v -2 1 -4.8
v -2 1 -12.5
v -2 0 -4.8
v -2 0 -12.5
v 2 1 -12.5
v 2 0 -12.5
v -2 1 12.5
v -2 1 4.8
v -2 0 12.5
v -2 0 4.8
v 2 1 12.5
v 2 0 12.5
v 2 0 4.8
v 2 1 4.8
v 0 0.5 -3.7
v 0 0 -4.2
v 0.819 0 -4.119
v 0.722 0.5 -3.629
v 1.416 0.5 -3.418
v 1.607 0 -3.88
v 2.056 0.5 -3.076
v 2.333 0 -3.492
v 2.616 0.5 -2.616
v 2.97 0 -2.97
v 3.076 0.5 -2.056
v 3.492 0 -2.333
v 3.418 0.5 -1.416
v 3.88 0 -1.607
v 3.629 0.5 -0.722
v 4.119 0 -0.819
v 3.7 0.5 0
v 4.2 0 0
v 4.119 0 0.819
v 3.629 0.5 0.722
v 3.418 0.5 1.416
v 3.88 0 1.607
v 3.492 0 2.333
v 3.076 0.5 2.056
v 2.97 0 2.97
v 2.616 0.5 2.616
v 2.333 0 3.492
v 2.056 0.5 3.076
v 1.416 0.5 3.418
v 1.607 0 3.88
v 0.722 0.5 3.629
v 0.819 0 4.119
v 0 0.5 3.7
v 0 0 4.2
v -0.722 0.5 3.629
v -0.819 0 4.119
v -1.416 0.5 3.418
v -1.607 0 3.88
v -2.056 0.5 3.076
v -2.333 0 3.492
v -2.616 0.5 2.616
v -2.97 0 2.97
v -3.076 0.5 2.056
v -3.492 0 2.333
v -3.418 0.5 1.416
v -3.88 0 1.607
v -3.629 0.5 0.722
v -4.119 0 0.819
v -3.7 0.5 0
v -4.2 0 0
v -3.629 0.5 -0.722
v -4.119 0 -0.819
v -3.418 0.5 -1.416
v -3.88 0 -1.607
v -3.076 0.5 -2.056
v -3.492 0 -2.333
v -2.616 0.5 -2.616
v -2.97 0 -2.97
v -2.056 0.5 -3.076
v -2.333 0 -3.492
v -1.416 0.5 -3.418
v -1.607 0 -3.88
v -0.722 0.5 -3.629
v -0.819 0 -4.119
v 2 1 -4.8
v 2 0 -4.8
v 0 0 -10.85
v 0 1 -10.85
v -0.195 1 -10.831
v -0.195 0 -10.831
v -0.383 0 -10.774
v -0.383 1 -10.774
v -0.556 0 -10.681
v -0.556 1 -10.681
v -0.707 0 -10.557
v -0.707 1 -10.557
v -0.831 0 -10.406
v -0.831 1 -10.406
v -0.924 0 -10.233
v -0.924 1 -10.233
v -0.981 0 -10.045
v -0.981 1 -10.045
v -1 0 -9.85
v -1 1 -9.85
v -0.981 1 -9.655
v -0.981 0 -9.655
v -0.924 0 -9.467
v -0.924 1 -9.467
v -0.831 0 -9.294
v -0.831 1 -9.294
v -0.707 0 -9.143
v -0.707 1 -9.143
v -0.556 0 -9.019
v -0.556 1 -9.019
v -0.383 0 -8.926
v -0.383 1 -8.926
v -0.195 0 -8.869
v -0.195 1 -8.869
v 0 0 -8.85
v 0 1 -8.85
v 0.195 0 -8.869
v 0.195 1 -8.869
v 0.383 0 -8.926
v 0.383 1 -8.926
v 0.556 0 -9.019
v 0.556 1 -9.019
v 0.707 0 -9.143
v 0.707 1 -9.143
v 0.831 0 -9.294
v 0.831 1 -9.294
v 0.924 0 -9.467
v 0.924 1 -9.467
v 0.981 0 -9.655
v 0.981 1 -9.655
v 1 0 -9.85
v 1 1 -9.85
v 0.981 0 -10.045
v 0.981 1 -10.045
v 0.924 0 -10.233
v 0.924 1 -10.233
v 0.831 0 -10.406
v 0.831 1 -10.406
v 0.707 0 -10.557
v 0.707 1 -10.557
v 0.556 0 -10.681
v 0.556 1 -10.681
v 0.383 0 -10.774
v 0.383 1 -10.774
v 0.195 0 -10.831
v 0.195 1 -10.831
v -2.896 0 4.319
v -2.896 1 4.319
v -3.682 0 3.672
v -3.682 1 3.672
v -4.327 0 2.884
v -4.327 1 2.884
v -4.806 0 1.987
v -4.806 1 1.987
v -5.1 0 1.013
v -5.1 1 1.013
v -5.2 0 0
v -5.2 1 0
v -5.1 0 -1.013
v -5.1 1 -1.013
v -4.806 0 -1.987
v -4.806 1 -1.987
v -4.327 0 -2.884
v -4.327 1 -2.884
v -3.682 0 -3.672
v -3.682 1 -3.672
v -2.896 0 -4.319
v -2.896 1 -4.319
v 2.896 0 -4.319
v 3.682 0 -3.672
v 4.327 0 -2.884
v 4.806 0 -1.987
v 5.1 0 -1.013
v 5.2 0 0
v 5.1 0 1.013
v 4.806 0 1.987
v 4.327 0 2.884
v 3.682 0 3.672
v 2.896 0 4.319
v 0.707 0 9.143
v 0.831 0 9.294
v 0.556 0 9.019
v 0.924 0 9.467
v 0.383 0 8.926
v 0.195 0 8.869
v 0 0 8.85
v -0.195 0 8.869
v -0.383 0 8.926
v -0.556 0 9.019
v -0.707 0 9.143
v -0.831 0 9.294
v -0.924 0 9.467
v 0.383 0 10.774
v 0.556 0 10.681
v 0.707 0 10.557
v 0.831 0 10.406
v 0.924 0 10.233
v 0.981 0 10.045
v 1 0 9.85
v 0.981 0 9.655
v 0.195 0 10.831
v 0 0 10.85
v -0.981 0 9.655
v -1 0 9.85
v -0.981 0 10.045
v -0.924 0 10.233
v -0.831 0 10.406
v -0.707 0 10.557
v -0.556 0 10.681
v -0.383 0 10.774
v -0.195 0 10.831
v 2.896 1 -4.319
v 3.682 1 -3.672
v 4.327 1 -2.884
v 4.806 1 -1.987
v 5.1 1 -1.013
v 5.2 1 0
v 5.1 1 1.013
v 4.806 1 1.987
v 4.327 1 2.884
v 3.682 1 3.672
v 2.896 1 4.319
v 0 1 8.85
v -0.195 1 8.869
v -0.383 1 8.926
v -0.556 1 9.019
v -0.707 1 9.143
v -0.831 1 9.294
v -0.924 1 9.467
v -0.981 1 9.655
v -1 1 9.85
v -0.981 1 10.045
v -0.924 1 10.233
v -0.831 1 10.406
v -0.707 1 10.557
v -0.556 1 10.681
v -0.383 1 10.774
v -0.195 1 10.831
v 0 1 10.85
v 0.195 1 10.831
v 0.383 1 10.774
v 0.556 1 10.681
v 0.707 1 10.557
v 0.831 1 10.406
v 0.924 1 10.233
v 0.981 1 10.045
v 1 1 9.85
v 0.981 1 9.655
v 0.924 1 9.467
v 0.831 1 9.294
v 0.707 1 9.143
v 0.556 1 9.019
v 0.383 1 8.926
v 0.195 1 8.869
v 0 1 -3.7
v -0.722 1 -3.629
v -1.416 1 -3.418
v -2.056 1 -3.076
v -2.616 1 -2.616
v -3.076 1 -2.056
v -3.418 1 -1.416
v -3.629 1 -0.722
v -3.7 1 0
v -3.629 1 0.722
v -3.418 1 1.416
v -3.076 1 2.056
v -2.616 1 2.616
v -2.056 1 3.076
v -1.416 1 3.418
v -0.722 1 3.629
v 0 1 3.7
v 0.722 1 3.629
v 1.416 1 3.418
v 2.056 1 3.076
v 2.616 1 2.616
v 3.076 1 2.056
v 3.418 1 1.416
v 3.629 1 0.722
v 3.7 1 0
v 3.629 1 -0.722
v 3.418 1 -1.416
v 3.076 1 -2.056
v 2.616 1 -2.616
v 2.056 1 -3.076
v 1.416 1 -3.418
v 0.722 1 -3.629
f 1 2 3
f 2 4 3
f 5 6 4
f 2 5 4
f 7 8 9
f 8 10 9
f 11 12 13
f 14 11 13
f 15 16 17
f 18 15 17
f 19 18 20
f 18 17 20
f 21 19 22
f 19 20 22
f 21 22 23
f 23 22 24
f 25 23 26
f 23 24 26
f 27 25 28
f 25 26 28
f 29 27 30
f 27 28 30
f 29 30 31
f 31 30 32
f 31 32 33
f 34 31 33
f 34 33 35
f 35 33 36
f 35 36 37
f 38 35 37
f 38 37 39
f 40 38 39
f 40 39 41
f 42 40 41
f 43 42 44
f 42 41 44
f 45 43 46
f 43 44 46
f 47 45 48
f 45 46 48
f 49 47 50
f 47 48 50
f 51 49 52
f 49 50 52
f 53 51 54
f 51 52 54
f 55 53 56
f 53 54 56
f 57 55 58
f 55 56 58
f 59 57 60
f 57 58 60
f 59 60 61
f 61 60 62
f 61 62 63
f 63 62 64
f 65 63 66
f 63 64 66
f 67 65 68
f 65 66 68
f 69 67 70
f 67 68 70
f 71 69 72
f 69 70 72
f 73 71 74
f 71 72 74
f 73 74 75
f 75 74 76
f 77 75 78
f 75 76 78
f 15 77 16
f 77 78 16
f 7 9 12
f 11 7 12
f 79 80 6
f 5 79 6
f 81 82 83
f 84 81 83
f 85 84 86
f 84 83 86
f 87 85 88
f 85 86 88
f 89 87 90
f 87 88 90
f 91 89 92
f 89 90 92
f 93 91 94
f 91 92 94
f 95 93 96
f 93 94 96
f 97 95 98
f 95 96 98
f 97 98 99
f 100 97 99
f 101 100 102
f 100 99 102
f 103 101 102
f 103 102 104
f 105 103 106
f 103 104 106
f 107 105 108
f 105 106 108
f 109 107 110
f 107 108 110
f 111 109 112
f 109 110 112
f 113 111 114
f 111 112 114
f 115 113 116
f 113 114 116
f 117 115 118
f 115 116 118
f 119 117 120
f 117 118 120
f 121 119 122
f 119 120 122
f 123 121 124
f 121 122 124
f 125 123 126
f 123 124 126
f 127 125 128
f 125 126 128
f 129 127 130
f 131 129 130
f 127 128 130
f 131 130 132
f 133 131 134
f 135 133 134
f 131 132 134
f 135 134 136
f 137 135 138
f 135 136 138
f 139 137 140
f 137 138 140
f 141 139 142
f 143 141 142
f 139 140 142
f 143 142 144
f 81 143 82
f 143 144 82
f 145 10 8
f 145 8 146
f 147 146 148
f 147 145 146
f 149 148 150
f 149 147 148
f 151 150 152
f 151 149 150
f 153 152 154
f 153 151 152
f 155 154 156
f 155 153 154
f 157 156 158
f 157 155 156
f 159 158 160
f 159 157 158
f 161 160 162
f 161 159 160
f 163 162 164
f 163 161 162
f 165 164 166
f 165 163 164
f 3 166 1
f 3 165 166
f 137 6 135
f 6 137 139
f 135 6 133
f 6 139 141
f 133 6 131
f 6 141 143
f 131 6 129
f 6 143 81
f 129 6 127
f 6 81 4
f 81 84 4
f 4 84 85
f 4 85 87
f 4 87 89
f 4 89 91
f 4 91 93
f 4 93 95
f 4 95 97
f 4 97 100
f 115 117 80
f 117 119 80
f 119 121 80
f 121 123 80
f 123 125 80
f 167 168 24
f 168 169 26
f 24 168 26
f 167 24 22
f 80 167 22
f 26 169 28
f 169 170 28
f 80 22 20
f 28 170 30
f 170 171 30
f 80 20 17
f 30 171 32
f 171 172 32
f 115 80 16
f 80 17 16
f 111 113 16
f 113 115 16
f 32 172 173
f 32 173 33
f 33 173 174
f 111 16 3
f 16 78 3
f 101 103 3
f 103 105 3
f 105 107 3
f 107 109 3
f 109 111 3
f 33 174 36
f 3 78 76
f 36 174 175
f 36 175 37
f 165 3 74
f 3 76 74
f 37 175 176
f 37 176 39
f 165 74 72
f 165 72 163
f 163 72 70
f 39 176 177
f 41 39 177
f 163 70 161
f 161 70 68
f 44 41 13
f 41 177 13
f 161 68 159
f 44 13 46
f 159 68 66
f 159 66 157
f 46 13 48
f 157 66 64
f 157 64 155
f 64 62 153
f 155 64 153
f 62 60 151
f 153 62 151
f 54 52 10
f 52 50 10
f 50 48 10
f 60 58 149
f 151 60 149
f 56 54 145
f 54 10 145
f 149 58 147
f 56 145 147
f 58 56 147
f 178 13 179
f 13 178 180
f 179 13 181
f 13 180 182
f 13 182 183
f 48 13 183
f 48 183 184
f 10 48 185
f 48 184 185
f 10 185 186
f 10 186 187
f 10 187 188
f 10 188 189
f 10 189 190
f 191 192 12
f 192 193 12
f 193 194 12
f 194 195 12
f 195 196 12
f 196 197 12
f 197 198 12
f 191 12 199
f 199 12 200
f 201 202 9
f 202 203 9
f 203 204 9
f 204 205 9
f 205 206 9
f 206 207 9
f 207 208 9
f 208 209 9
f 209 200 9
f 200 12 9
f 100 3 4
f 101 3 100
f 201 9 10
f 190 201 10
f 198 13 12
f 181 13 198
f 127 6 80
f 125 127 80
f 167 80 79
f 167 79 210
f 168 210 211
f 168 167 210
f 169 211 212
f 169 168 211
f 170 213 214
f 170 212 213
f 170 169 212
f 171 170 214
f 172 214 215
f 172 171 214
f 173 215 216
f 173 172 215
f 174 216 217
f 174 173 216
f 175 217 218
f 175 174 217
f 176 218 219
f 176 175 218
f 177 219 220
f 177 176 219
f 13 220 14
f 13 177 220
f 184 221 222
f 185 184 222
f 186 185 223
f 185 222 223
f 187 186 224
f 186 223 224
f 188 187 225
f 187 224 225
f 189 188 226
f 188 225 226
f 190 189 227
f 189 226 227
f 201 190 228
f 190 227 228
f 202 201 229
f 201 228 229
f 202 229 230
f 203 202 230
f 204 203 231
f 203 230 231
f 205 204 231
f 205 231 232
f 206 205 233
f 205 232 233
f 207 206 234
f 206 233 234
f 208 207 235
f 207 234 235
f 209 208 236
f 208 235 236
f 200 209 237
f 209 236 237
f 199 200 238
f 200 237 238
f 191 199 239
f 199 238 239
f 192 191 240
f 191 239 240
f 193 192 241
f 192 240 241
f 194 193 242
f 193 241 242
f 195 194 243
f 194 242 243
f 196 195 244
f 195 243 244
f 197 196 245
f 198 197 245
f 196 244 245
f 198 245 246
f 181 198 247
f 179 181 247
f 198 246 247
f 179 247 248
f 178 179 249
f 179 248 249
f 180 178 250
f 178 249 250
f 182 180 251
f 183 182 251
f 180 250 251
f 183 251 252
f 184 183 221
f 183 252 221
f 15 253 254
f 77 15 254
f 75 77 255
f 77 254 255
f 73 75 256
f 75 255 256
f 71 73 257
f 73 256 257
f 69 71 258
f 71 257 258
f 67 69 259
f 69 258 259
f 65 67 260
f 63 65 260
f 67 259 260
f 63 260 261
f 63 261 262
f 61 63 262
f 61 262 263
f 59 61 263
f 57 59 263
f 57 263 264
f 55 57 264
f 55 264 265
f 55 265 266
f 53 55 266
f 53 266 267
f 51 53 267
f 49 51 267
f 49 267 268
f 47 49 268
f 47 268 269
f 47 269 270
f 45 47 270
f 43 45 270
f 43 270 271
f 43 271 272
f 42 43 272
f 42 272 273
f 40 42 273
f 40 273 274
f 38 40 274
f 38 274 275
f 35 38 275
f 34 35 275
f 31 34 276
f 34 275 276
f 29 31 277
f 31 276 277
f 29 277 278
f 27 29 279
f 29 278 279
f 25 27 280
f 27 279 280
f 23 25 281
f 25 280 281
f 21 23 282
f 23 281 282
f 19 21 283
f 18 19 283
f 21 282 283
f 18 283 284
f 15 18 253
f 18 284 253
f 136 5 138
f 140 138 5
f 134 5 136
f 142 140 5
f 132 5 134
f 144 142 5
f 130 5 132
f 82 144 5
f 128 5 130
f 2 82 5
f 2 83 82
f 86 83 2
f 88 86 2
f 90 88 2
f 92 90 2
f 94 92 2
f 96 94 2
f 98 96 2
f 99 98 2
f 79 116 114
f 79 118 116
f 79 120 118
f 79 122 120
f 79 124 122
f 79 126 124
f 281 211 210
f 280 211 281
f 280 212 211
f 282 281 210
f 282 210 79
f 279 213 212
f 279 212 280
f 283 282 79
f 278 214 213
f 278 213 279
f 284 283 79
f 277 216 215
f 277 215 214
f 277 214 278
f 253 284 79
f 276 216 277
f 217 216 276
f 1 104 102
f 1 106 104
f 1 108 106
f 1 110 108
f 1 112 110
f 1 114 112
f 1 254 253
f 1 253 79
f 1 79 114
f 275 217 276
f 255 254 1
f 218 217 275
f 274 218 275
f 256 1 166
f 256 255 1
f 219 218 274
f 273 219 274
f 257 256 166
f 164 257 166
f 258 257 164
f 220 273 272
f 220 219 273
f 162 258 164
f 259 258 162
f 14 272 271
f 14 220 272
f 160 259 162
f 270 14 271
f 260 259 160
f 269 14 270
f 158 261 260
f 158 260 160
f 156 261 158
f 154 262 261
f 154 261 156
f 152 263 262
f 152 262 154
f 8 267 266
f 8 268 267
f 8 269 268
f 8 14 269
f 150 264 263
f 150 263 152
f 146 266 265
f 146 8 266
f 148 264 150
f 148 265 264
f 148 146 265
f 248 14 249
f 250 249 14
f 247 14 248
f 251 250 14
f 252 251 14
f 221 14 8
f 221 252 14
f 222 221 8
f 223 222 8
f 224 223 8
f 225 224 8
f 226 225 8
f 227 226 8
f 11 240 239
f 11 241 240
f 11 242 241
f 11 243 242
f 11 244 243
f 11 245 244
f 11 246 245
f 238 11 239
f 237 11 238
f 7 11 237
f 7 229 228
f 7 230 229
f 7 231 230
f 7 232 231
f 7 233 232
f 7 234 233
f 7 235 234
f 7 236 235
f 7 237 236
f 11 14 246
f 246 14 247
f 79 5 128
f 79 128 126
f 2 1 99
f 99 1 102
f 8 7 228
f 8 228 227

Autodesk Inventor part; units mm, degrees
ref_plane "YZ Plane" through (0, 0, 0) normal (1, 0, 0) x (0, 1, 0)
ref_plane "XZ Plane" through (0, 0, 0) normal (0, 1, 0) x (-1, 0, 0)
ref_plane "XY Plane" through (0, 0, 0) normal (0, 0, 1) x (1, 0, 0)
sketch "Sketch1" plane through (0, 0, 0) normal (0, 1, 0) x (-1, 0, 0)
  circle A0 centre (0, 0) radius 5.2
  line L0 (2, 12.5) -> (-2, 12.5)
  line L1 (-2, 12.5) -> (-2, -12.5)
  line L2 (-2, -12.5) -> (2, -12.5)
  line L3 (2, -12.5) -> (2, 12.5)
  line L4 (2, 12.5) -> (-2, -12.5) construction
  line L5 (-2, 12.5) -> (2, -12.5) construction
  line L6 (0, 12.5) -> (0, 9.85)
  line L7 (0, -12.5) -> (0, -9.85)
  point P0 (-2, 4.8)
  point P1 (-2, -4.8)
  point P2 (2, -4.8)
  point P3 (2, 4.8)
  dimension "d0" = 10.4
  dimension "d1" = 4
  dimension "d2" = 25
  dimension "d19" = 2.65
  dimension "d20" = 2.65
extrude "Extrusion1" add sketch "Sketch1" along normal blind 1
hole "Hole2" at (0, 0, 0) direction (0, 1, 0) diameter 7.4 depth 1 tip angle 118 countersink diameter 8.4 countersink angle 90
hole "Hole3" at (0, 0, 9.85) direction (0, 1, 0) diameter 2 depth 1 tip angle 118
hole "Hole4" at (0, 0, -9.85) direction (0, 1, 0) diameter 2 depth 1 tip angle 118
properties part number "Headplate_2p"
